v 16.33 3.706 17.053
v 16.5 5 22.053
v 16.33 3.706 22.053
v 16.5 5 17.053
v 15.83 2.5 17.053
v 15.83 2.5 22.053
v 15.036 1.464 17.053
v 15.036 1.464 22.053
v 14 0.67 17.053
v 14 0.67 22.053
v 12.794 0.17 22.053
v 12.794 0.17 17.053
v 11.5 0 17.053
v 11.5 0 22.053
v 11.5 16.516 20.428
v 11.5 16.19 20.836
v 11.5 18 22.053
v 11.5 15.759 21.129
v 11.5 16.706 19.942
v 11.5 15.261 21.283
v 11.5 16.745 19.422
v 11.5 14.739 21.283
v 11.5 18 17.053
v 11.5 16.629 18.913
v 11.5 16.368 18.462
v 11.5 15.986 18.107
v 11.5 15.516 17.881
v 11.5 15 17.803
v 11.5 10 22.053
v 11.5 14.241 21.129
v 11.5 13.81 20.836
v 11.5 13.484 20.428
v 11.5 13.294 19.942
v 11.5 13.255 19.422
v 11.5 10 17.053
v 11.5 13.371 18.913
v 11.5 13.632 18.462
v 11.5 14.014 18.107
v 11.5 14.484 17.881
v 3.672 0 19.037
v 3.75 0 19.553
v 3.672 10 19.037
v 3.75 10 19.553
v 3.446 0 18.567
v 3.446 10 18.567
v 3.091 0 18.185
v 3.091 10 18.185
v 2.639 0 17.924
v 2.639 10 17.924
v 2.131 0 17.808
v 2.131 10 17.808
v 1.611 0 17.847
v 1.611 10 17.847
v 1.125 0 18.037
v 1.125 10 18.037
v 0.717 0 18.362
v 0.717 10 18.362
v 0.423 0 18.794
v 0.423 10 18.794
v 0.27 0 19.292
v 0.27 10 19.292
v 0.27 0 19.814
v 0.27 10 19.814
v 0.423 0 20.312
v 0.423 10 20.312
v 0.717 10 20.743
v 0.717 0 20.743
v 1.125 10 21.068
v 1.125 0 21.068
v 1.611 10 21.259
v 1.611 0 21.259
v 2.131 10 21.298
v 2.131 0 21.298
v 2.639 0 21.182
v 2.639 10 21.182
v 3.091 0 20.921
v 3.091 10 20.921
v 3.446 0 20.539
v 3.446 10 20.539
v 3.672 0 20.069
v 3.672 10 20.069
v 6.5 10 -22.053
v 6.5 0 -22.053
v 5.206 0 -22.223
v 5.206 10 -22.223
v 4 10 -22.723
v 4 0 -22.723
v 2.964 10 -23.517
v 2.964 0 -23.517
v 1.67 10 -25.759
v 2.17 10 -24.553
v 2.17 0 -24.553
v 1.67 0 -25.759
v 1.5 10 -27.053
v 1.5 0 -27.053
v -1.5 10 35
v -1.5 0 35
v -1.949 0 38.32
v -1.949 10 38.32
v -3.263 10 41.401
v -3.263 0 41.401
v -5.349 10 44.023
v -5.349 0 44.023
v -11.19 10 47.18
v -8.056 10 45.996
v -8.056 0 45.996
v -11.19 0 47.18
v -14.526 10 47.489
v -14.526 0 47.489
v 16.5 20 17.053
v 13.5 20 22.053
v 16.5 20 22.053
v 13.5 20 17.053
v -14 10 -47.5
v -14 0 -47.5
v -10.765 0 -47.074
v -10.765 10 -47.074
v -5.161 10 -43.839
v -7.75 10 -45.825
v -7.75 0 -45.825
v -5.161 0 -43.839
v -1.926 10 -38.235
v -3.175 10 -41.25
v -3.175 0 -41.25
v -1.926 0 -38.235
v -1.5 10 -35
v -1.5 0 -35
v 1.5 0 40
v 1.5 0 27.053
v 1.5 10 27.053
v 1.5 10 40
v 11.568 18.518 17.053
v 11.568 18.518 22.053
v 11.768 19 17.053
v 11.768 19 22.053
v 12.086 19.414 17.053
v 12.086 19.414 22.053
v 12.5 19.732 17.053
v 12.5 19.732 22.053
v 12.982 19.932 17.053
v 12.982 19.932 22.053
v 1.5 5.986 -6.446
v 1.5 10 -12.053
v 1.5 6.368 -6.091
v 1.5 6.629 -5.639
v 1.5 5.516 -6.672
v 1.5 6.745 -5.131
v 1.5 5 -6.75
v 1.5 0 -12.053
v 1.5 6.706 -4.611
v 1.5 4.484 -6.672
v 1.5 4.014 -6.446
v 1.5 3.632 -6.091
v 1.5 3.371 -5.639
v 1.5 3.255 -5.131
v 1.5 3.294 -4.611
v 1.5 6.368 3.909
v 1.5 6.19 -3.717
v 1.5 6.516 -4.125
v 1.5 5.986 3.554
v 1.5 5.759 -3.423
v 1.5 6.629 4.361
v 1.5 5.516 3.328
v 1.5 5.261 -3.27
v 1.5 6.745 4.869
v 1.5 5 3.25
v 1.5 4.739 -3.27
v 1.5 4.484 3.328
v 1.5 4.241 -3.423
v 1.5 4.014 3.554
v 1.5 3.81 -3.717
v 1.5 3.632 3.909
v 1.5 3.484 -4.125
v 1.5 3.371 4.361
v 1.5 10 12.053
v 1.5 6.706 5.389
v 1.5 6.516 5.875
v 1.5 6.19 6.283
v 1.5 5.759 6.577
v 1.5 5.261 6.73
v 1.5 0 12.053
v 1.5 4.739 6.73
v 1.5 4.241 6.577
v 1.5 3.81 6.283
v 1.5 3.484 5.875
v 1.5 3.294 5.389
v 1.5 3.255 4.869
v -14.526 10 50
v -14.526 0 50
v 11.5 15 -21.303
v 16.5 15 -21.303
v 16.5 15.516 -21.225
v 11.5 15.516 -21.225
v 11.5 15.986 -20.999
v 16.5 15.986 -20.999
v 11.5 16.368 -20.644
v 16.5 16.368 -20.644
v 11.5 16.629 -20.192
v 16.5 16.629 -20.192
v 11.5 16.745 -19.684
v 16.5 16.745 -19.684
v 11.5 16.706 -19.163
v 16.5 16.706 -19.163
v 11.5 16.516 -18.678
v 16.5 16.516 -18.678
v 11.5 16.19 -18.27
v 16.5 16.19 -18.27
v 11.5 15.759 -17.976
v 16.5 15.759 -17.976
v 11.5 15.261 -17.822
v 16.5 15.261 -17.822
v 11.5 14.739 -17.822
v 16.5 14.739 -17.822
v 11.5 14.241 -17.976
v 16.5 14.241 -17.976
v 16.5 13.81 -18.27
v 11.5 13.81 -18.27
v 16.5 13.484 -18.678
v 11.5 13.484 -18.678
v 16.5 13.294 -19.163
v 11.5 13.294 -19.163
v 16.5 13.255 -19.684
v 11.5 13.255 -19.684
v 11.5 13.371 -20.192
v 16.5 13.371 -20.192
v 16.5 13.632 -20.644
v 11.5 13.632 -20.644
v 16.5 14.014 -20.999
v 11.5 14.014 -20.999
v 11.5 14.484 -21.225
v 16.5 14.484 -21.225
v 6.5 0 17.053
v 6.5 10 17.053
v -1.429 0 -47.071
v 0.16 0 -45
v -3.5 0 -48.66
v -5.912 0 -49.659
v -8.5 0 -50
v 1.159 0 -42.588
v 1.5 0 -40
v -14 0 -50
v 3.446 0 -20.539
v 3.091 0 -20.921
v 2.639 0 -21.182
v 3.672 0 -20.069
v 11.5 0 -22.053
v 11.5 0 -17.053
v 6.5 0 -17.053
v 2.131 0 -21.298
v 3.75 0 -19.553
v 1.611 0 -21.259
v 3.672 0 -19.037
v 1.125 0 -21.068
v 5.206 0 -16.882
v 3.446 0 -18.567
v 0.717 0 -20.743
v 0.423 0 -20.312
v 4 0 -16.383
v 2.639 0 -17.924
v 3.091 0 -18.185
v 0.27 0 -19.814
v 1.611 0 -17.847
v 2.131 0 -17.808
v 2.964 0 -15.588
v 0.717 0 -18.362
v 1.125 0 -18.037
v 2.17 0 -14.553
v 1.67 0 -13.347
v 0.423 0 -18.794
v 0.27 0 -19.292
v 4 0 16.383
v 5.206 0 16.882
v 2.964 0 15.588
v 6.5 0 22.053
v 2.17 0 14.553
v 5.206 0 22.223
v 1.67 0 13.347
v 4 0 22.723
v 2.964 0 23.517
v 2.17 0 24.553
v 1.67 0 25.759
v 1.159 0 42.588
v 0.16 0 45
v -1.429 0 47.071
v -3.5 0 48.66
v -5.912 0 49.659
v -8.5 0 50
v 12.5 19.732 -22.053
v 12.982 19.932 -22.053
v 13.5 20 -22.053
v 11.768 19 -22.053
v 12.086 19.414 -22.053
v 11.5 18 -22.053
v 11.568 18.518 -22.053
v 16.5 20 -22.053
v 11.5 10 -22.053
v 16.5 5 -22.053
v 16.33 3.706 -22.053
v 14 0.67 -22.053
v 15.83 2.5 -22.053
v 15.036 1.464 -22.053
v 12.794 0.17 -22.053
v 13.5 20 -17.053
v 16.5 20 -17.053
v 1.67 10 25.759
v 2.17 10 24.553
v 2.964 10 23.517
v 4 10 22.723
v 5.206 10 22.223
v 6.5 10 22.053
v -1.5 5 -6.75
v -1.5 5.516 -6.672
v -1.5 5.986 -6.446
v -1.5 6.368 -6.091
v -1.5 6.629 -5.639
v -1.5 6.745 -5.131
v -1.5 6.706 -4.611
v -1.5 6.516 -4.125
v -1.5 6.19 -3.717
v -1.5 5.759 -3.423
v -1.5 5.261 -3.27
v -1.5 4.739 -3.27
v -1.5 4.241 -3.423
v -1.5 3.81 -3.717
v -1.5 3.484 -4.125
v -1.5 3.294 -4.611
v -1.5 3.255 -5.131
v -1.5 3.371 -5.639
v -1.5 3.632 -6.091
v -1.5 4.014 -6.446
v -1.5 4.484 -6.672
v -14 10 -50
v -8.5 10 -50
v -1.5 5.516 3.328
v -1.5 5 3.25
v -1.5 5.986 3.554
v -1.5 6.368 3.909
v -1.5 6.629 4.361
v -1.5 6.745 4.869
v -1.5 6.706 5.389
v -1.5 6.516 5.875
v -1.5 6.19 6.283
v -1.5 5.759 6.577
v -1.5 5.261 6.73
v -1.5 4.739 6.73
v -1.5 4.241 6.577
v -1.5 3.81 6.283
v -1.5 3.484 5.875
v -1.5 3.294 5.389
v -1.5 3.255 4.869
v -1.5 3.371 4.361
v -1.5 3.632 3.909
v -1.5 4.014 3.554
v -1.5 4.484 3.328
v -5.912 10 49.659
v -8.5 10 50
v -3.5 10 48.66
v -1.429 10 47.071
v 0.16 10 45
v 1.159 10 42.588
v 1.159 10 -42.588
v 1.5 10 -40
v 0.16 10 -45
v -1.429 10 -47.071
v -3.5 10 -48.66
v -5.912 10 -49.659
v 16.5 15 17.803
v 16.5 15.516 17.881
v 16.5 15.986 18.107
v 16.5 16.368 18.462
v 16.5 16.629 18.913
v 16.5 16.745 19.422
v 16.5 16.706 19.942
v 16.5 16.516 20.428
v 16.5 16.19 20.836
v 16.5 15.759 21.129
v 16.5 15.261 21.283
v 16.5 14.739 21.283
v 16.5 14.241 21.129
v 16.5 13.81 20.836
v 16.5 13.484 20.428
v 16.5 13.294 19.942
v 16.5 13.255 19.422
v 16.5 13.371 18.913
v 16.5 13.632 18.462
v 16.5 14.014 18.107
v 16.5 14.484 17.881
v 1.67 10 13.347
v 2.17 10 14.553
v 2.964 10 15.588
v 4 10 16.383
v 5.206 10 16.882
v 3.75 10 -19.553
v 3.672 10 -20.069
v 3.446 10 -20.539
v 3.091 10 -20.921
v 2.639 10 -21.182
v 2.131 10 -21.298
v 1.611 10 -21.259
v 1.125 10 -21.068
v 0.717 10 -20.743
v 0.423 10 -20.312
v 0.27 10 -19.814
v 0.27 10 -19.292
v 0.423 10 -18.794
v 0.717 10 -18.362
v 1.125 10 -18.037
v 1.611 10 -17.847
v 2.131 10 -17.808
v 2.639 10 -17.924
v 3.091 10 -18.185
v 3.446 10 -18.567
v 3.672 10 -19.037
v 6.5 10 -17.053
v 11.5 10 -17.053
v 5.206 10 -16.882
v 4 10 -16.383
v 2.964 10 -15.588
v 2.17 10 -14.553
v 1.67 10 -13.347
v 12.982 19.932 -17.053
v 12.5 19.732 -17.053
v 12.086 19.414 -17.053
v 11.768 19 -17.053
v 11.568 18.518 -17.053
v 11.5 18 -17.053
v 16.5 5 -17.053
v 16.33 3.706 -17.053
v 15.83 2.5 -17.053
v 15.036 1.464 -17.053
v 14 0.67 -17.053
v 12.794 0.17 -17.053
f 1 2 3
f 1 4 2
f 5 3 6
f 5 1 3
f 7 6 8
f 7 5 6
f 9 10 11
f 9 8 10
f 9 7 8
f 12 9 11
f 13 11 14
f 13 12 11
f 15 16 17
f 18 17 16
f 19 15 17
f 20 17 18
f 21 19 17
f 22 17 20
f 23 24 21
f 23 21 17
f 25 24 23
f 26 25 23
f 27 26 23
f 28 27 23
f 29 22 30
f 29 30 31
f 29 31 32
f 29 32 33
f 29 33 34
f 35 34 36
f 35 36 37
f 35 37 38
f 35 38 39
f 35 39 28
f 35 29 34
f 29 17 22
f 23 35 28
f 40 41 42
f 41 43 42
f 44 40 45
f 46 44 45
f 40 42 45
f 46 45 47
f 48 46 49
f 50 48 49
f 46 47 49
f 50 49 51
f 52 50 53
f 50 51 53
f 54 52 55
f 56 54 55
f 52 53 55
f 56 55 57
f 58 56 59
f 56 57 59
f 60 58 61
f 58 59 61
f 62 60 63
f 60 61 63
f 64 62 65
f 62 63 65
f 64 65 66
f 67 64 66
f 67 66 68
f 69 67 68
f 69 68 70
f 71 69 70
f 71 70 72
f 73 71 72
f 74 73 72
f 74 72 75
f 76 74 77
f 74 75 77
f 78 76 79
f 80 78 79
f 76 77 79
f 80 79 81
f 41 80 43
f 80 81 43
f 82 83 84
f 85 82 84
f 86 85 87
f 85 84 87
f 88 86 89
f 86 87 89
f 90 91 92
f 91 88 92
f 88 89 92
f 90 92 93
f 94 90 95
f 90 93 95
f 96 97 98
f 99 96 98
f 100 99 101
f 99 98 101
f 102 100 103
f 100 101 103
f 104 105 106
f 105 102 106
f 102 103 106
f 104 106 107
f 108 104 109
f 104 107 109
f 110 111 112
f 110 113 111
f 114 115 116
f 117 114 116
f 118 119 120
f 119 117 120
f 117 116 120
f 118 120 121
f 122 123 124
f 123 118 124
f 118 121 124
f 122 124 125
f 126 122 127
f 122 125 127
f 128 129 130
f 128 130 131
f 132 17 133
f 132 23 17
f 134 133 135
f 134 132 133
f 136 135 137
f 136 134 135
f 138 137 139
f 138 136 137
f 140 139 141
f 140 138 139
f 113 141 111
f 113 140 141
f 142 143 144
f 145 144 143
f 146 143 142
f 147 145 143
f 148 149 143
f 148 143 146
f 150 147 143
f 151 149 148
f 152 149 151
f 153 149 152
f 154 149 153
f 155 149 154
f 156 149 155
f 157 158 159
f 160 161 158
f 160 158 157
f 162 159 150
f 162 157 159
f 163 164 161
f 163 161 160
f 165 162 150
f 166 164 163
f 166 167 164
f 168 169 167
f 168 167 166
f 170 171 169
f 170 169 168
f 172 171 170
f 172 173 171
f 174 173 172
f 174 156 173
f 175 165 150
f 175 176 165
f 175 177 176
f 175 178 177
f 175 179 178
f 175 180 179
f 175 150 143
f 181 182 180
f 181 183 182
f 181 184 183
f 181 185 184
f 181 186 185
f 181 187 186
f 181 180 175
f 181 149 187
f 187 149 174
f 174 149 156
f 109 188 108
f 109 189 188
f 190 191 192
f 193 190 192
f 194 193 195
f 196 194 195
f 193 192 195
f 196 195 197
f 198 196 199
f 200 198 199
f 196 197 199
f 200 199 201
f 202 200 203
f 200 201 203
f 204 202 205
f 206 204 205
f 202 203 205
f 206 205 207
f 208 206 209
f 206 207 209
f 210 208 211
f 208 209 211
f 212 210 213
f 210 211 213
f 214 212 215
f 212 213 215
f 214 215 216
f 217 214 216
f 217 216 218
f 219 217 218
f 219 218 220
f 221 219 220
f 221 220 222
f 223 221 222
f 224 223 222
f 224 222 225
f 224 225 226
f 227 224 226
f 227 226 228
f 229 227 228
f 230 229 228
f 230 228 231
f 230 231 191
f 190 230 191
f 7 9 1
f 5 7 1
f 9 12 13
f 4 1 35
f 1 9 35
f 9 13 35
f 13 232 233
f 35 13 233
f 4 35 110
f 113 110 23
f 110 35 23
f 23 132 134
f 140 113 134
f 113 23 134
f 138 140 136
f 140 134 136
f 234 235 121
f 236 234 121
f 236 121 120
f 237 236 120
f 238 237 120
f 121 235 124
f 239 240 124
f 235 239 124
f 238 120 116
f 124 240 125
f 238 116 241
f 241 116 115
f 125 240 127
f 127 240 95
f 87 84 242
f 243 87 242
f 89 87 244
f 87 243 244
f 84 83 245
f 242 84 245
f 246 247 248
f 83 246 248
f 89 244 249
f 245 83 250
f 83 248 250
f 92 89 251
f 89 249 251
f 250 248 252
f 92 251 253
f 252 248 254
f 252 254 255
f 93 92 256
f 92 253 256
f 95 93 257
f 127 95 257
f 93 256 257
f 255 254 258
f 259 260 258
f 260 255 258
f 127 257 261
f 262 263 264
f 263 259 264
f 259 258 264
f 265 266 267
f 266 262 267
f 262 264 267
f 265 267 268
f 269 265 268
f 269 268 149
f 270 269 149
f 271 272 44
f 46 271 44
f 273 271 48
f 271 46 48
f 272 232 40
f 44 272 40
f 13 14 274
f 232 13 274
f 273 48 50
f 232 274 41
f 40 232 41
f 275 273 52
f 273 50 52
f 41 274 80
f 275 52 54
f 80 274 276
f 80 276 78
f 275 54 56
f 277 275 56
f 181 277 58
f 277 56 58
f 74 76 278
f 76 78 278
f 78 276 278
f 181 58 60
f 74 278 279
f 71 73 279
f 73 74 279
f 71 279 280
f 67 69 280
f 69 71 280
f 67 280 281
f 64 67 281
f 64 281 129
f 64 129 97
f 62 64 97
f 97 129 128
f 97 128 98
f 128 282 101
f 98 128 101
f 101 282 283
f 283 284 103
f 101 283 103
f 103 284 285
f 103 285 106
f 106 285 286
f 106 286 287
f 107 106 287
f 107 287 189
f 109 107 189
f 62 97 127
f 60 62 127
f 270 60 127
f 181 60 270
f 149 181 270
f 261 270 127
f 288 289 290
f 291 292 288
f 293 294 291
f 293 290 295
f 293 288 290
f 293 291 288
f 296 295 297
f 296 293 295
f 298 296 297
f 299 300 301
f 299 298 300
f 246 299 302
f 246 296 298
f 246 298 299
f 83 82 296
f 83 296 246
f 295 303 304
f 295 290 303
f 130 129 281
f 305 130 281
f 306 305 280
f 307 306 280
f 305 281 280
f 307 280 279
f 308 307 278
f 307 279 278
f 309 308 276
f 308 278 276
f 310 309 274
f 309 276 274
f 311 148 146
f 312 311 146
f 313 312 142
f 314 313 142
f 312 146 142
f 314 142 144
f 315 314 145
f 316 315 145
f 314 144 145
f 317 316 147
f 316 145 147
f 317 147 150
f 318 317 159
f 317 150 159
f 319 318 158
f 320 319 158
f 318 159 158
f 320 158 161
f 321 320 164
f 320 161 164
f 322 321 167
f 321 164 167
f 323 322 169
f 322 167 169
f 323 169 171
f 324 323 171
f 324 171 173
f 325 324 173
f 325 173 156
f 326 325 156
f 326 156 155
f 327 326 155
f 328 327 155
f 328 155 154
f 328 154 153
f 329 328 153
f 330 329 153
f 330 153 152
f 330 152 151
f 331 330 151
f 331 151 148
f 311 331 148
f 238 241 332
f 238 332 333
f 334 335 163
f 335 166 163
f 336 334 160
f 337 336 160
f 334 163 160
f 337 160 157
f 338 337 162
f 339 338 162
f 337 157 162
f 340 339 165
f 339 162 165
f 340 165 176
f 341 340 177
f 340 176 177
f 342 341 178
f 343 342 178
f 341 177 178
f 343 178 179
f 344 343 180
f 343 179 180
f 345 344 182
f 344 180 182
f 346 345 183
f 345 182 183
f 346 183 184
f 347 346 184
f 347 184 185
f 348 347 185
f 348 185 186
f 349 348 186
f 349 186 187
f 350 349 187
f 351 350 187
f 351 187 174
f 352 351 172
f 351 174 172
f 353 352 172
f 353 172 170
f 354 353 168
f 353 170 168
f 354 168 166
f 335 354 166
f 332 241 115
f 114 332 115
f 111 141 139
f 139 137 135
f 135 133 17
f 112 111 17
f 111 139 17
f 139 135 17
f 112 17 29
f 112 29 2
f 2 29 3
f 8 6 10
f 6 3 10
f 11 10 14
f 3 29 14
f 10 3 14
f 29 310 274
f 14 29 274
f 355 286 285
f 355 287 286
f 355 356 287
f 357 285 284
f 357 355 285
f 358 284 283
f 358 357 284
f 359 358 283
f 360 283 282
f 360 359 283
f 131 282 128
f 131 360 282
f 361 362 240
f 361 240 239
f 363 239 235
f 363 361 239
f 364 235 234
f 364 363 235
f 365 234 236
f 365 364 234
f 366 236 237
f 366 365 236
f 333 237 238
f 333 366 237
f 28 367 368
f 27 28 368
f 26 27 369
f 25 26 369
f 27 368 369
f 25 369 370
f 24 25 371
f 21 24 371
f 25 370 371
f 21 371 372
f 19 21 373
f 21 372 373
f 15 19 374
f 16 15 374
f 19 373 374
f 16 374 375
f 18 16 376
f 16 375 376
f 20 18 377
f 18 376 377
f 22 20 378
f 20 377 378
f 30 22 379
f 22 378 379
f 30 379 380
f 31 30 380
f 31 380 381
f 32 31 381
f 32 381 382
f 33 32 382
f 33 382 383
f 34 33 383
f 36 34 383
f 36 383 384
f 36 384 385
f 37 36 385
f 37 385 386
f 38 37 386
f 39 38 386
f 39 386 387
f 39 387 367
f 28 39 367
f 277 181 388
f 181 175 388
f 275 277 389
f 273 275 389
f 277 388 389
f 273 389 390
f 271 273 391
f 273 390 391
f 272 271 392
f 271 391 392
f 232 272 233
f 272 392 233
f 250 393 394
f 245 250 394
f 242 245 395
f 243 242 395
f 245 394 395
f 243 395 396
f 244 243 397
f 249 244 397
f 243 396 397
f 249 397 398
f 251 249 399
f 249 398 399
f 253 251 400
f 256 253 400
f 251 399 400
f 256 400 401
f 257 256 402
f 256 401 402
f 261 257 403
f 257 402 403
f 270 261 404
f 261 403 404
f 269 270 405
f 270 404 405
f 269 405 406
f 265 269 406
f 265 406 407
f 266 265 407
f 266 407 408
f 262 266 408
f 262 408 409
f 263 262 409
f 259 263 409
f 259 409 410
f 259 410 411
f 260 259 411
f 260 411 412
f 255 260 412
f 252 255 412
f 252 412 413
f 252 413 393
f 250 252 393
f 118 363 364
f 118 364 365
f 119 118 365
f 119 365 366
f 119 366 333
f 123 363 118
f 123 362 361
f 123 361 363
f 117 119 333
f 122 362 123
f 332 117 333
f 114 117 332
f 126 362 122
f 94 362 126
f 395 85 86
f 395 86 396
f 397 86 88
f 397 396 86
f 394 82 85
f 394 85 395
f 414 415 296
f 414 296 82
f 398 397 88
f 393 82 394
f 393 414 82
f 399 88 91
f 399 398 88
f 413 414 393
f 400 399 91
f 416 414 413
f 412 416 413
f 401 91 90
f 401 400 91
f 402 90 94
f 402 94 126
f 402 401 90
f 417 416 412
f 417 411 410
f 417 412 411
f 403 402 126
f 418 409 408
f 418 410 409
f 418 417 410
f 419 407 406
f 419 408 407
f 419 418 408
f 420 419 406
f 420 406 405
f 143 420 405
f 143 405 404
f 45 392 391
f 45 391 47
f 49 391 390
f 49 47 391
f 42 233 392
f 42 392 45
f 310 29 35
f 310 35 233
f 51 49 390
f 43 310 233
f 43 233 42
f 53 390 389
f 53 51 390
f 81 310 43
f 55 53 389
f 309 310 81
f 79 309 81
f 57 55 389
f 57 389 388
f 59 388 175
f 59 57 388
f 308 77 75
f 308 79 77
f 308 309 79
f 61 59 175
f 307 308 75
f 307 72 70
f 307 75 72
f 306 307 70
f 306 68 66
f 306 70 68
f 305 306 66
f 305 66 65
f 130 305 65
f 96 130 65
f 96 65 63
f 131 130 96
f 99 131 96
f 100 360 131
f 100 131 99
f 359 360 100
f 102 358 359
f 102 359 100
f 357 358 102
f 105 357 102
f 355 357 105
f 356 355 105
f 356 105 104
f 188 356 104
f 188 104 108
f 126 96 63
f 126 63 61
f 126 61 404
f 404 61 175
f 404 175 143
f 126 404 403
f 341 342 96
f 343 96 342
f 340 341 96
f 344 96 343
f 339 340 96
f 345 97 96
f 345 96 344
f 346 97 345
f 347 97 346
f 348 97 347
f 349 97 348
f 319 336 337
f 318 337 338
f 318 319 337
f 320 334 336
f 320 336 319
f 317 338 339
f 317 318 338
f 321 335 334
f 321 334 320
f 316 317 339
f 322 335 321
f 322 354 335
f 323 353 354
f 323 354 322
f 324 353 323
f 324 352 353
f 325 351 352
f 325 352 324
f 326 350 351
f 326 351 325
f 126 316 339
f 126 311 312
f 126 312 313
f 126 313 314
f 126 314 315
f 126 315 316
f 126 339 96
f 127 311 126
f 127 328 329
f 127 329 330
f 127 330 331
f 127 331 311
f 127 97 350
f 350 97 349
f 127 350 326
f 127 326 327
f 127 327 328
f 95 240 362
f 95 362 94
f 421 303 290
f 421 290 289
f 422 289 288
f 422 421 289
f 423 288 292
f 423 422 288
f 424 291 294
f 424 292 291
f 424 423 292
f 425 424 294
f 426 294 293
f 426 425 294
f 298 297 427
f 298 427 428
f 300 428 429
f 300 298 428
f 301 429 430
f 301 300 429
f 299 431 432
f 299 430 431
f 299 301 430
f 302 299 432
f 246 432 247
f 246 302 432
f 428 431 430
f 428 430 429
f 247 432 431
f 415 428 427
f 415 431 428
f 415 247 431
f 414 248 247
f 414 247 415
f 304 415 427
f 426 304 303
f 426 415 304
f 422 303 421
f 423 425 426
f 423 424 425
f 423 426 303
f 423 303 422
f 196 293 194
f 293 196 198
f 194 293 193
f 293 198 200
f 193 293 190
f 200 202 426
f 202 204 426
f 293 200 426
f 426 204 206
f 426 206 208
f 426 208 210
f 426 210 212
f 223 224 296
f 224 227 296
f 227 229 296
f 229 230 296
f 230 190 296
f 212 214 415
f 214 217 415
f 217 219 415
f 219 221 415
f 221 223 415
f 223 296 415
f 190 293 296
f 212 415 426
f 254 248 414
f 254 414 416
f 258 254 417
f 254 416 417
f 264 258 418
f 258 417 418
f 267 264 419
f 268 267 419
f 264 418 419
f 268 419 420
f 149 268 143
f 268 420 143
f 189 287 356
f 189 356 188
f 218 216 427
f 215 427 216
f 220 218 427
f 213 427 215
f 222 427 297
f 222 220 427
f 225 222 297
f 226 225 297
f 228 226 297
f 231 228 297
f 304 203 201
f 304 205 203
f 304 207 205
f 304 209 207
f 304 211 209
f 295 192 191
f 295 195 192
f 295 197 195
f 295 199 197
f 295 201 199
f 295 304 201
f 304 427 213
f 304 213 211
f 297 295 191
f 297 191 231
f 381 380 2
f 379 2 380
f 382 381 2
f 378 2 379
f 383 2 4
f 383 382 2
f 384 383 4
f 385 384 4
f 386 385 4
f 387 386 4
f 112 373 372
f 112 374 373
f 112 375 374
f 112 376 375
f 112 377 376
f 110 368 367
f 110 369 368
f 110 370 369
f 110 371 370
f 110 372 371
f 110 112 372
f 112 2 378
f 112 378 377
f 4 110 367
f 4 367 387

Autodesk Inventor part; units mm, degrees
ref_plane "YZ Plane" through (0, 0, 0) normal (1, 0, 0) x (0, 1, 0)
ref_plane "XZ Plane" through (0, 0, 0) normal (0, 1, 0) x (-1, 0, 0)
ref_plane "XY Plane" through (0, 0, 0) normal (0, 0, 1) x (1, 0, 0)
sketch "Esquisse1" plane through (0, 0, 0) normal (0, 1, 0) x (-1, 0, 0)
  line L0 (-1.5, 50) -> (1.5, 50)
  line L1 (1.5, 50) -> (1.5, -50)
  line L2 (1.5, -50) -> (-1.5, -50)
  line L3 (-1.5, -50) -> (-1.5, 50)
  line L4 (1.5, 50) -> (-1.5, -50)
  line L5 (-1.5, 50) -> (1.5, -50)
  circle A0 centre (14, -35) radius 12.5
  line L6 (-10, 0) -> (16, 0)
  circle A1 centre (14, 35) radius 12.5
  line L7 (1.5, -50) -> (14, -50)
  line L8 (14, -50) -> (14, -47.5)
  line L9 (9, -23.5436) -> (9, 23.5436)
  line L10 (1.5, 50) -> (14.5259, 50)
  line L11 (14.5259, 50) -> (14.5259, 47.4889)
  point P0 (0, 0)
  point P1 (0, 0)
  point P2 (0, 0)
  point P3 (14, -22.5)
  point P4 (14, 22.5)
  point P5 (1.5, 35)
  point P6 (1.5, -35)
  dimension "d0" = 3
  dimension "d1" = 100
  dimension "d19" = 25
extrude "Extrusion1" add sketch "Esquisse1" along normal blind 10 contours L5 L6 L3 | L0 L4 L5 | L10 L11 A1 L1 | L1 L6 L4 | L6 L4 L3 | L5 L2 L4 | L6 L1 L5 | L1 A0 L8 L7
sketch "Esquisse2" plane through (1.5, 0, 50) normal (1, 0, 0) x (0, 0, -1)
  line L0 (0, 0) -> (100, 0) projected
  line L1 (27.9472, 0) -> (32.9472, 0)
  line L2 (32.9472, 0) -> (32.9472, 10)
  line L3 (32.9472, 10) -> (27.9472, 10)
  line L4 (27.9472, 10) -> (27.9472, 0)
  line L5 (50, 0) -> (50, 10.1076)
  line L6 (67.0528, 0) -> (67.0528, 10)
  line L7 (67.0528, 10) -> (72.0528, 10)
  line L8 (72.0528, 10) -> (72.0528, 0)
  dimension "d4" = 5
  dimension "d5" = 10
extrude "Extrusion2" add sketch "Esquisse2" along normal blind 15
fillet "Congé1" radius 10 2 edges at (1.5, 5, -50) (1.5, 5, 50)
sketch "Esquisse5" plane through (0, 10, 0) normal (0, 1, 0) x (1, 0, 0)
  line L0 (16.5, 17.0528) -> (16.5, 22.0528) projected
  line L1 (1.5, 17.0528) -> (16.5, 17.0528) projected
  line L2 (16.5, 22.0528) -> (11.5, 22.0528)
  line L3 (11.5, 22.0528) -> (11.5, 17.0528)
  line L4 (11.5, 17.0528) -> (16.5, 17.0528)
  line L5 (16.5, 17.0528) -> (16.5, 22.0528)
  line L6 (-9, 0) -> (10, 0)
  line L7 (16.5, -17.0528) -> (16.5, -22.0528)
  line L8 (16.5, -22.0528) -> (11.5, -22.0528)
  line L9 (11.5, -22.0528) -> (11.5, -17.0528)
  line L10 (11.5, -17.0528) -> (16.5, -17.0528)
  line L11 (16.5, -17.0528) -> (16.5, -22.0528)
  point P0 (0, 0)
  dimension "d22" = 5
extrude "Extrusion5" add sketch "Esquisse5" along normal blind 10
sketch "Esquisse6" plane through (16.5, 0, 50) normal (1, 0, 0) x (0, 0, -1)
  circle A0 centre (30.4472, 15) radius 1.75
  line L0 (27.9472, 20) -> (32.9472, 20) projected
  line L1 (27.9472, 0) -> (27.9472, 20) projected
  line L2 (50, 0) -> (50, 10)
  circle A1 centre (69.5528, 15) radius 1.75
  point P0 (30.4472, 20)
  dimension "d25" = 3.5
  dimension "d26" = 5
  dimension "d27" = 2.5
extrude "Extrusion6" cut sketch "Esquisse6" against normal blind 10
fillet "Congé2" radius 5 6 edges at (16.5, 0, 19.5528) (16.5, 0, -19.5528) (1.5, 5, 22.0528) (1.5, 5, -22.0528) (1.5, 5, -17.0528) (1.5, 5, 17.0528)
fillet "Congé3" radius 2 2 edges at (11.5, 20, 19.5528) (11.5, 20, -19.5528)
sketch "Esquisse7" plane through (0, 10, 0) normal (0, 1, 0) x (1, 0, 0)
  circle A0 centre (2, 19.5528) radius 1.75
  line L0 (-3.6278, 0) -> (5, 0)
  circle A1 centre (2, -19.5528) radius 1.75
  line L1 (6.5, 22.0528) -> (11.5, 22.0528) projected
  point P0 (0, 0)
  dimension "d32" = 3.5
  dimension "d33" = 2.5
extrude "Extrusion7" cut sketch "Esquisse7" against normal blind 23
sketch "Esquisse8" plane through (1.5, 0, 12.0528) normal (1, 0, 0) x (0, 0, -1)
  circle A0 centre (7.0528, 5) radius 1.75
  line L0 (12.0528, 0) -> (12.0528, 10)
  circle A1 centre (17.0528, 5) radius 1.75
  point P0 (12.0528, 5)
  dimension "d36" = 3.5
  dimension "d37" = 5
extrude "Extrusion8" cut sketch "Esquisse8" against normal blind 3
properties part number "pare-chocs"
